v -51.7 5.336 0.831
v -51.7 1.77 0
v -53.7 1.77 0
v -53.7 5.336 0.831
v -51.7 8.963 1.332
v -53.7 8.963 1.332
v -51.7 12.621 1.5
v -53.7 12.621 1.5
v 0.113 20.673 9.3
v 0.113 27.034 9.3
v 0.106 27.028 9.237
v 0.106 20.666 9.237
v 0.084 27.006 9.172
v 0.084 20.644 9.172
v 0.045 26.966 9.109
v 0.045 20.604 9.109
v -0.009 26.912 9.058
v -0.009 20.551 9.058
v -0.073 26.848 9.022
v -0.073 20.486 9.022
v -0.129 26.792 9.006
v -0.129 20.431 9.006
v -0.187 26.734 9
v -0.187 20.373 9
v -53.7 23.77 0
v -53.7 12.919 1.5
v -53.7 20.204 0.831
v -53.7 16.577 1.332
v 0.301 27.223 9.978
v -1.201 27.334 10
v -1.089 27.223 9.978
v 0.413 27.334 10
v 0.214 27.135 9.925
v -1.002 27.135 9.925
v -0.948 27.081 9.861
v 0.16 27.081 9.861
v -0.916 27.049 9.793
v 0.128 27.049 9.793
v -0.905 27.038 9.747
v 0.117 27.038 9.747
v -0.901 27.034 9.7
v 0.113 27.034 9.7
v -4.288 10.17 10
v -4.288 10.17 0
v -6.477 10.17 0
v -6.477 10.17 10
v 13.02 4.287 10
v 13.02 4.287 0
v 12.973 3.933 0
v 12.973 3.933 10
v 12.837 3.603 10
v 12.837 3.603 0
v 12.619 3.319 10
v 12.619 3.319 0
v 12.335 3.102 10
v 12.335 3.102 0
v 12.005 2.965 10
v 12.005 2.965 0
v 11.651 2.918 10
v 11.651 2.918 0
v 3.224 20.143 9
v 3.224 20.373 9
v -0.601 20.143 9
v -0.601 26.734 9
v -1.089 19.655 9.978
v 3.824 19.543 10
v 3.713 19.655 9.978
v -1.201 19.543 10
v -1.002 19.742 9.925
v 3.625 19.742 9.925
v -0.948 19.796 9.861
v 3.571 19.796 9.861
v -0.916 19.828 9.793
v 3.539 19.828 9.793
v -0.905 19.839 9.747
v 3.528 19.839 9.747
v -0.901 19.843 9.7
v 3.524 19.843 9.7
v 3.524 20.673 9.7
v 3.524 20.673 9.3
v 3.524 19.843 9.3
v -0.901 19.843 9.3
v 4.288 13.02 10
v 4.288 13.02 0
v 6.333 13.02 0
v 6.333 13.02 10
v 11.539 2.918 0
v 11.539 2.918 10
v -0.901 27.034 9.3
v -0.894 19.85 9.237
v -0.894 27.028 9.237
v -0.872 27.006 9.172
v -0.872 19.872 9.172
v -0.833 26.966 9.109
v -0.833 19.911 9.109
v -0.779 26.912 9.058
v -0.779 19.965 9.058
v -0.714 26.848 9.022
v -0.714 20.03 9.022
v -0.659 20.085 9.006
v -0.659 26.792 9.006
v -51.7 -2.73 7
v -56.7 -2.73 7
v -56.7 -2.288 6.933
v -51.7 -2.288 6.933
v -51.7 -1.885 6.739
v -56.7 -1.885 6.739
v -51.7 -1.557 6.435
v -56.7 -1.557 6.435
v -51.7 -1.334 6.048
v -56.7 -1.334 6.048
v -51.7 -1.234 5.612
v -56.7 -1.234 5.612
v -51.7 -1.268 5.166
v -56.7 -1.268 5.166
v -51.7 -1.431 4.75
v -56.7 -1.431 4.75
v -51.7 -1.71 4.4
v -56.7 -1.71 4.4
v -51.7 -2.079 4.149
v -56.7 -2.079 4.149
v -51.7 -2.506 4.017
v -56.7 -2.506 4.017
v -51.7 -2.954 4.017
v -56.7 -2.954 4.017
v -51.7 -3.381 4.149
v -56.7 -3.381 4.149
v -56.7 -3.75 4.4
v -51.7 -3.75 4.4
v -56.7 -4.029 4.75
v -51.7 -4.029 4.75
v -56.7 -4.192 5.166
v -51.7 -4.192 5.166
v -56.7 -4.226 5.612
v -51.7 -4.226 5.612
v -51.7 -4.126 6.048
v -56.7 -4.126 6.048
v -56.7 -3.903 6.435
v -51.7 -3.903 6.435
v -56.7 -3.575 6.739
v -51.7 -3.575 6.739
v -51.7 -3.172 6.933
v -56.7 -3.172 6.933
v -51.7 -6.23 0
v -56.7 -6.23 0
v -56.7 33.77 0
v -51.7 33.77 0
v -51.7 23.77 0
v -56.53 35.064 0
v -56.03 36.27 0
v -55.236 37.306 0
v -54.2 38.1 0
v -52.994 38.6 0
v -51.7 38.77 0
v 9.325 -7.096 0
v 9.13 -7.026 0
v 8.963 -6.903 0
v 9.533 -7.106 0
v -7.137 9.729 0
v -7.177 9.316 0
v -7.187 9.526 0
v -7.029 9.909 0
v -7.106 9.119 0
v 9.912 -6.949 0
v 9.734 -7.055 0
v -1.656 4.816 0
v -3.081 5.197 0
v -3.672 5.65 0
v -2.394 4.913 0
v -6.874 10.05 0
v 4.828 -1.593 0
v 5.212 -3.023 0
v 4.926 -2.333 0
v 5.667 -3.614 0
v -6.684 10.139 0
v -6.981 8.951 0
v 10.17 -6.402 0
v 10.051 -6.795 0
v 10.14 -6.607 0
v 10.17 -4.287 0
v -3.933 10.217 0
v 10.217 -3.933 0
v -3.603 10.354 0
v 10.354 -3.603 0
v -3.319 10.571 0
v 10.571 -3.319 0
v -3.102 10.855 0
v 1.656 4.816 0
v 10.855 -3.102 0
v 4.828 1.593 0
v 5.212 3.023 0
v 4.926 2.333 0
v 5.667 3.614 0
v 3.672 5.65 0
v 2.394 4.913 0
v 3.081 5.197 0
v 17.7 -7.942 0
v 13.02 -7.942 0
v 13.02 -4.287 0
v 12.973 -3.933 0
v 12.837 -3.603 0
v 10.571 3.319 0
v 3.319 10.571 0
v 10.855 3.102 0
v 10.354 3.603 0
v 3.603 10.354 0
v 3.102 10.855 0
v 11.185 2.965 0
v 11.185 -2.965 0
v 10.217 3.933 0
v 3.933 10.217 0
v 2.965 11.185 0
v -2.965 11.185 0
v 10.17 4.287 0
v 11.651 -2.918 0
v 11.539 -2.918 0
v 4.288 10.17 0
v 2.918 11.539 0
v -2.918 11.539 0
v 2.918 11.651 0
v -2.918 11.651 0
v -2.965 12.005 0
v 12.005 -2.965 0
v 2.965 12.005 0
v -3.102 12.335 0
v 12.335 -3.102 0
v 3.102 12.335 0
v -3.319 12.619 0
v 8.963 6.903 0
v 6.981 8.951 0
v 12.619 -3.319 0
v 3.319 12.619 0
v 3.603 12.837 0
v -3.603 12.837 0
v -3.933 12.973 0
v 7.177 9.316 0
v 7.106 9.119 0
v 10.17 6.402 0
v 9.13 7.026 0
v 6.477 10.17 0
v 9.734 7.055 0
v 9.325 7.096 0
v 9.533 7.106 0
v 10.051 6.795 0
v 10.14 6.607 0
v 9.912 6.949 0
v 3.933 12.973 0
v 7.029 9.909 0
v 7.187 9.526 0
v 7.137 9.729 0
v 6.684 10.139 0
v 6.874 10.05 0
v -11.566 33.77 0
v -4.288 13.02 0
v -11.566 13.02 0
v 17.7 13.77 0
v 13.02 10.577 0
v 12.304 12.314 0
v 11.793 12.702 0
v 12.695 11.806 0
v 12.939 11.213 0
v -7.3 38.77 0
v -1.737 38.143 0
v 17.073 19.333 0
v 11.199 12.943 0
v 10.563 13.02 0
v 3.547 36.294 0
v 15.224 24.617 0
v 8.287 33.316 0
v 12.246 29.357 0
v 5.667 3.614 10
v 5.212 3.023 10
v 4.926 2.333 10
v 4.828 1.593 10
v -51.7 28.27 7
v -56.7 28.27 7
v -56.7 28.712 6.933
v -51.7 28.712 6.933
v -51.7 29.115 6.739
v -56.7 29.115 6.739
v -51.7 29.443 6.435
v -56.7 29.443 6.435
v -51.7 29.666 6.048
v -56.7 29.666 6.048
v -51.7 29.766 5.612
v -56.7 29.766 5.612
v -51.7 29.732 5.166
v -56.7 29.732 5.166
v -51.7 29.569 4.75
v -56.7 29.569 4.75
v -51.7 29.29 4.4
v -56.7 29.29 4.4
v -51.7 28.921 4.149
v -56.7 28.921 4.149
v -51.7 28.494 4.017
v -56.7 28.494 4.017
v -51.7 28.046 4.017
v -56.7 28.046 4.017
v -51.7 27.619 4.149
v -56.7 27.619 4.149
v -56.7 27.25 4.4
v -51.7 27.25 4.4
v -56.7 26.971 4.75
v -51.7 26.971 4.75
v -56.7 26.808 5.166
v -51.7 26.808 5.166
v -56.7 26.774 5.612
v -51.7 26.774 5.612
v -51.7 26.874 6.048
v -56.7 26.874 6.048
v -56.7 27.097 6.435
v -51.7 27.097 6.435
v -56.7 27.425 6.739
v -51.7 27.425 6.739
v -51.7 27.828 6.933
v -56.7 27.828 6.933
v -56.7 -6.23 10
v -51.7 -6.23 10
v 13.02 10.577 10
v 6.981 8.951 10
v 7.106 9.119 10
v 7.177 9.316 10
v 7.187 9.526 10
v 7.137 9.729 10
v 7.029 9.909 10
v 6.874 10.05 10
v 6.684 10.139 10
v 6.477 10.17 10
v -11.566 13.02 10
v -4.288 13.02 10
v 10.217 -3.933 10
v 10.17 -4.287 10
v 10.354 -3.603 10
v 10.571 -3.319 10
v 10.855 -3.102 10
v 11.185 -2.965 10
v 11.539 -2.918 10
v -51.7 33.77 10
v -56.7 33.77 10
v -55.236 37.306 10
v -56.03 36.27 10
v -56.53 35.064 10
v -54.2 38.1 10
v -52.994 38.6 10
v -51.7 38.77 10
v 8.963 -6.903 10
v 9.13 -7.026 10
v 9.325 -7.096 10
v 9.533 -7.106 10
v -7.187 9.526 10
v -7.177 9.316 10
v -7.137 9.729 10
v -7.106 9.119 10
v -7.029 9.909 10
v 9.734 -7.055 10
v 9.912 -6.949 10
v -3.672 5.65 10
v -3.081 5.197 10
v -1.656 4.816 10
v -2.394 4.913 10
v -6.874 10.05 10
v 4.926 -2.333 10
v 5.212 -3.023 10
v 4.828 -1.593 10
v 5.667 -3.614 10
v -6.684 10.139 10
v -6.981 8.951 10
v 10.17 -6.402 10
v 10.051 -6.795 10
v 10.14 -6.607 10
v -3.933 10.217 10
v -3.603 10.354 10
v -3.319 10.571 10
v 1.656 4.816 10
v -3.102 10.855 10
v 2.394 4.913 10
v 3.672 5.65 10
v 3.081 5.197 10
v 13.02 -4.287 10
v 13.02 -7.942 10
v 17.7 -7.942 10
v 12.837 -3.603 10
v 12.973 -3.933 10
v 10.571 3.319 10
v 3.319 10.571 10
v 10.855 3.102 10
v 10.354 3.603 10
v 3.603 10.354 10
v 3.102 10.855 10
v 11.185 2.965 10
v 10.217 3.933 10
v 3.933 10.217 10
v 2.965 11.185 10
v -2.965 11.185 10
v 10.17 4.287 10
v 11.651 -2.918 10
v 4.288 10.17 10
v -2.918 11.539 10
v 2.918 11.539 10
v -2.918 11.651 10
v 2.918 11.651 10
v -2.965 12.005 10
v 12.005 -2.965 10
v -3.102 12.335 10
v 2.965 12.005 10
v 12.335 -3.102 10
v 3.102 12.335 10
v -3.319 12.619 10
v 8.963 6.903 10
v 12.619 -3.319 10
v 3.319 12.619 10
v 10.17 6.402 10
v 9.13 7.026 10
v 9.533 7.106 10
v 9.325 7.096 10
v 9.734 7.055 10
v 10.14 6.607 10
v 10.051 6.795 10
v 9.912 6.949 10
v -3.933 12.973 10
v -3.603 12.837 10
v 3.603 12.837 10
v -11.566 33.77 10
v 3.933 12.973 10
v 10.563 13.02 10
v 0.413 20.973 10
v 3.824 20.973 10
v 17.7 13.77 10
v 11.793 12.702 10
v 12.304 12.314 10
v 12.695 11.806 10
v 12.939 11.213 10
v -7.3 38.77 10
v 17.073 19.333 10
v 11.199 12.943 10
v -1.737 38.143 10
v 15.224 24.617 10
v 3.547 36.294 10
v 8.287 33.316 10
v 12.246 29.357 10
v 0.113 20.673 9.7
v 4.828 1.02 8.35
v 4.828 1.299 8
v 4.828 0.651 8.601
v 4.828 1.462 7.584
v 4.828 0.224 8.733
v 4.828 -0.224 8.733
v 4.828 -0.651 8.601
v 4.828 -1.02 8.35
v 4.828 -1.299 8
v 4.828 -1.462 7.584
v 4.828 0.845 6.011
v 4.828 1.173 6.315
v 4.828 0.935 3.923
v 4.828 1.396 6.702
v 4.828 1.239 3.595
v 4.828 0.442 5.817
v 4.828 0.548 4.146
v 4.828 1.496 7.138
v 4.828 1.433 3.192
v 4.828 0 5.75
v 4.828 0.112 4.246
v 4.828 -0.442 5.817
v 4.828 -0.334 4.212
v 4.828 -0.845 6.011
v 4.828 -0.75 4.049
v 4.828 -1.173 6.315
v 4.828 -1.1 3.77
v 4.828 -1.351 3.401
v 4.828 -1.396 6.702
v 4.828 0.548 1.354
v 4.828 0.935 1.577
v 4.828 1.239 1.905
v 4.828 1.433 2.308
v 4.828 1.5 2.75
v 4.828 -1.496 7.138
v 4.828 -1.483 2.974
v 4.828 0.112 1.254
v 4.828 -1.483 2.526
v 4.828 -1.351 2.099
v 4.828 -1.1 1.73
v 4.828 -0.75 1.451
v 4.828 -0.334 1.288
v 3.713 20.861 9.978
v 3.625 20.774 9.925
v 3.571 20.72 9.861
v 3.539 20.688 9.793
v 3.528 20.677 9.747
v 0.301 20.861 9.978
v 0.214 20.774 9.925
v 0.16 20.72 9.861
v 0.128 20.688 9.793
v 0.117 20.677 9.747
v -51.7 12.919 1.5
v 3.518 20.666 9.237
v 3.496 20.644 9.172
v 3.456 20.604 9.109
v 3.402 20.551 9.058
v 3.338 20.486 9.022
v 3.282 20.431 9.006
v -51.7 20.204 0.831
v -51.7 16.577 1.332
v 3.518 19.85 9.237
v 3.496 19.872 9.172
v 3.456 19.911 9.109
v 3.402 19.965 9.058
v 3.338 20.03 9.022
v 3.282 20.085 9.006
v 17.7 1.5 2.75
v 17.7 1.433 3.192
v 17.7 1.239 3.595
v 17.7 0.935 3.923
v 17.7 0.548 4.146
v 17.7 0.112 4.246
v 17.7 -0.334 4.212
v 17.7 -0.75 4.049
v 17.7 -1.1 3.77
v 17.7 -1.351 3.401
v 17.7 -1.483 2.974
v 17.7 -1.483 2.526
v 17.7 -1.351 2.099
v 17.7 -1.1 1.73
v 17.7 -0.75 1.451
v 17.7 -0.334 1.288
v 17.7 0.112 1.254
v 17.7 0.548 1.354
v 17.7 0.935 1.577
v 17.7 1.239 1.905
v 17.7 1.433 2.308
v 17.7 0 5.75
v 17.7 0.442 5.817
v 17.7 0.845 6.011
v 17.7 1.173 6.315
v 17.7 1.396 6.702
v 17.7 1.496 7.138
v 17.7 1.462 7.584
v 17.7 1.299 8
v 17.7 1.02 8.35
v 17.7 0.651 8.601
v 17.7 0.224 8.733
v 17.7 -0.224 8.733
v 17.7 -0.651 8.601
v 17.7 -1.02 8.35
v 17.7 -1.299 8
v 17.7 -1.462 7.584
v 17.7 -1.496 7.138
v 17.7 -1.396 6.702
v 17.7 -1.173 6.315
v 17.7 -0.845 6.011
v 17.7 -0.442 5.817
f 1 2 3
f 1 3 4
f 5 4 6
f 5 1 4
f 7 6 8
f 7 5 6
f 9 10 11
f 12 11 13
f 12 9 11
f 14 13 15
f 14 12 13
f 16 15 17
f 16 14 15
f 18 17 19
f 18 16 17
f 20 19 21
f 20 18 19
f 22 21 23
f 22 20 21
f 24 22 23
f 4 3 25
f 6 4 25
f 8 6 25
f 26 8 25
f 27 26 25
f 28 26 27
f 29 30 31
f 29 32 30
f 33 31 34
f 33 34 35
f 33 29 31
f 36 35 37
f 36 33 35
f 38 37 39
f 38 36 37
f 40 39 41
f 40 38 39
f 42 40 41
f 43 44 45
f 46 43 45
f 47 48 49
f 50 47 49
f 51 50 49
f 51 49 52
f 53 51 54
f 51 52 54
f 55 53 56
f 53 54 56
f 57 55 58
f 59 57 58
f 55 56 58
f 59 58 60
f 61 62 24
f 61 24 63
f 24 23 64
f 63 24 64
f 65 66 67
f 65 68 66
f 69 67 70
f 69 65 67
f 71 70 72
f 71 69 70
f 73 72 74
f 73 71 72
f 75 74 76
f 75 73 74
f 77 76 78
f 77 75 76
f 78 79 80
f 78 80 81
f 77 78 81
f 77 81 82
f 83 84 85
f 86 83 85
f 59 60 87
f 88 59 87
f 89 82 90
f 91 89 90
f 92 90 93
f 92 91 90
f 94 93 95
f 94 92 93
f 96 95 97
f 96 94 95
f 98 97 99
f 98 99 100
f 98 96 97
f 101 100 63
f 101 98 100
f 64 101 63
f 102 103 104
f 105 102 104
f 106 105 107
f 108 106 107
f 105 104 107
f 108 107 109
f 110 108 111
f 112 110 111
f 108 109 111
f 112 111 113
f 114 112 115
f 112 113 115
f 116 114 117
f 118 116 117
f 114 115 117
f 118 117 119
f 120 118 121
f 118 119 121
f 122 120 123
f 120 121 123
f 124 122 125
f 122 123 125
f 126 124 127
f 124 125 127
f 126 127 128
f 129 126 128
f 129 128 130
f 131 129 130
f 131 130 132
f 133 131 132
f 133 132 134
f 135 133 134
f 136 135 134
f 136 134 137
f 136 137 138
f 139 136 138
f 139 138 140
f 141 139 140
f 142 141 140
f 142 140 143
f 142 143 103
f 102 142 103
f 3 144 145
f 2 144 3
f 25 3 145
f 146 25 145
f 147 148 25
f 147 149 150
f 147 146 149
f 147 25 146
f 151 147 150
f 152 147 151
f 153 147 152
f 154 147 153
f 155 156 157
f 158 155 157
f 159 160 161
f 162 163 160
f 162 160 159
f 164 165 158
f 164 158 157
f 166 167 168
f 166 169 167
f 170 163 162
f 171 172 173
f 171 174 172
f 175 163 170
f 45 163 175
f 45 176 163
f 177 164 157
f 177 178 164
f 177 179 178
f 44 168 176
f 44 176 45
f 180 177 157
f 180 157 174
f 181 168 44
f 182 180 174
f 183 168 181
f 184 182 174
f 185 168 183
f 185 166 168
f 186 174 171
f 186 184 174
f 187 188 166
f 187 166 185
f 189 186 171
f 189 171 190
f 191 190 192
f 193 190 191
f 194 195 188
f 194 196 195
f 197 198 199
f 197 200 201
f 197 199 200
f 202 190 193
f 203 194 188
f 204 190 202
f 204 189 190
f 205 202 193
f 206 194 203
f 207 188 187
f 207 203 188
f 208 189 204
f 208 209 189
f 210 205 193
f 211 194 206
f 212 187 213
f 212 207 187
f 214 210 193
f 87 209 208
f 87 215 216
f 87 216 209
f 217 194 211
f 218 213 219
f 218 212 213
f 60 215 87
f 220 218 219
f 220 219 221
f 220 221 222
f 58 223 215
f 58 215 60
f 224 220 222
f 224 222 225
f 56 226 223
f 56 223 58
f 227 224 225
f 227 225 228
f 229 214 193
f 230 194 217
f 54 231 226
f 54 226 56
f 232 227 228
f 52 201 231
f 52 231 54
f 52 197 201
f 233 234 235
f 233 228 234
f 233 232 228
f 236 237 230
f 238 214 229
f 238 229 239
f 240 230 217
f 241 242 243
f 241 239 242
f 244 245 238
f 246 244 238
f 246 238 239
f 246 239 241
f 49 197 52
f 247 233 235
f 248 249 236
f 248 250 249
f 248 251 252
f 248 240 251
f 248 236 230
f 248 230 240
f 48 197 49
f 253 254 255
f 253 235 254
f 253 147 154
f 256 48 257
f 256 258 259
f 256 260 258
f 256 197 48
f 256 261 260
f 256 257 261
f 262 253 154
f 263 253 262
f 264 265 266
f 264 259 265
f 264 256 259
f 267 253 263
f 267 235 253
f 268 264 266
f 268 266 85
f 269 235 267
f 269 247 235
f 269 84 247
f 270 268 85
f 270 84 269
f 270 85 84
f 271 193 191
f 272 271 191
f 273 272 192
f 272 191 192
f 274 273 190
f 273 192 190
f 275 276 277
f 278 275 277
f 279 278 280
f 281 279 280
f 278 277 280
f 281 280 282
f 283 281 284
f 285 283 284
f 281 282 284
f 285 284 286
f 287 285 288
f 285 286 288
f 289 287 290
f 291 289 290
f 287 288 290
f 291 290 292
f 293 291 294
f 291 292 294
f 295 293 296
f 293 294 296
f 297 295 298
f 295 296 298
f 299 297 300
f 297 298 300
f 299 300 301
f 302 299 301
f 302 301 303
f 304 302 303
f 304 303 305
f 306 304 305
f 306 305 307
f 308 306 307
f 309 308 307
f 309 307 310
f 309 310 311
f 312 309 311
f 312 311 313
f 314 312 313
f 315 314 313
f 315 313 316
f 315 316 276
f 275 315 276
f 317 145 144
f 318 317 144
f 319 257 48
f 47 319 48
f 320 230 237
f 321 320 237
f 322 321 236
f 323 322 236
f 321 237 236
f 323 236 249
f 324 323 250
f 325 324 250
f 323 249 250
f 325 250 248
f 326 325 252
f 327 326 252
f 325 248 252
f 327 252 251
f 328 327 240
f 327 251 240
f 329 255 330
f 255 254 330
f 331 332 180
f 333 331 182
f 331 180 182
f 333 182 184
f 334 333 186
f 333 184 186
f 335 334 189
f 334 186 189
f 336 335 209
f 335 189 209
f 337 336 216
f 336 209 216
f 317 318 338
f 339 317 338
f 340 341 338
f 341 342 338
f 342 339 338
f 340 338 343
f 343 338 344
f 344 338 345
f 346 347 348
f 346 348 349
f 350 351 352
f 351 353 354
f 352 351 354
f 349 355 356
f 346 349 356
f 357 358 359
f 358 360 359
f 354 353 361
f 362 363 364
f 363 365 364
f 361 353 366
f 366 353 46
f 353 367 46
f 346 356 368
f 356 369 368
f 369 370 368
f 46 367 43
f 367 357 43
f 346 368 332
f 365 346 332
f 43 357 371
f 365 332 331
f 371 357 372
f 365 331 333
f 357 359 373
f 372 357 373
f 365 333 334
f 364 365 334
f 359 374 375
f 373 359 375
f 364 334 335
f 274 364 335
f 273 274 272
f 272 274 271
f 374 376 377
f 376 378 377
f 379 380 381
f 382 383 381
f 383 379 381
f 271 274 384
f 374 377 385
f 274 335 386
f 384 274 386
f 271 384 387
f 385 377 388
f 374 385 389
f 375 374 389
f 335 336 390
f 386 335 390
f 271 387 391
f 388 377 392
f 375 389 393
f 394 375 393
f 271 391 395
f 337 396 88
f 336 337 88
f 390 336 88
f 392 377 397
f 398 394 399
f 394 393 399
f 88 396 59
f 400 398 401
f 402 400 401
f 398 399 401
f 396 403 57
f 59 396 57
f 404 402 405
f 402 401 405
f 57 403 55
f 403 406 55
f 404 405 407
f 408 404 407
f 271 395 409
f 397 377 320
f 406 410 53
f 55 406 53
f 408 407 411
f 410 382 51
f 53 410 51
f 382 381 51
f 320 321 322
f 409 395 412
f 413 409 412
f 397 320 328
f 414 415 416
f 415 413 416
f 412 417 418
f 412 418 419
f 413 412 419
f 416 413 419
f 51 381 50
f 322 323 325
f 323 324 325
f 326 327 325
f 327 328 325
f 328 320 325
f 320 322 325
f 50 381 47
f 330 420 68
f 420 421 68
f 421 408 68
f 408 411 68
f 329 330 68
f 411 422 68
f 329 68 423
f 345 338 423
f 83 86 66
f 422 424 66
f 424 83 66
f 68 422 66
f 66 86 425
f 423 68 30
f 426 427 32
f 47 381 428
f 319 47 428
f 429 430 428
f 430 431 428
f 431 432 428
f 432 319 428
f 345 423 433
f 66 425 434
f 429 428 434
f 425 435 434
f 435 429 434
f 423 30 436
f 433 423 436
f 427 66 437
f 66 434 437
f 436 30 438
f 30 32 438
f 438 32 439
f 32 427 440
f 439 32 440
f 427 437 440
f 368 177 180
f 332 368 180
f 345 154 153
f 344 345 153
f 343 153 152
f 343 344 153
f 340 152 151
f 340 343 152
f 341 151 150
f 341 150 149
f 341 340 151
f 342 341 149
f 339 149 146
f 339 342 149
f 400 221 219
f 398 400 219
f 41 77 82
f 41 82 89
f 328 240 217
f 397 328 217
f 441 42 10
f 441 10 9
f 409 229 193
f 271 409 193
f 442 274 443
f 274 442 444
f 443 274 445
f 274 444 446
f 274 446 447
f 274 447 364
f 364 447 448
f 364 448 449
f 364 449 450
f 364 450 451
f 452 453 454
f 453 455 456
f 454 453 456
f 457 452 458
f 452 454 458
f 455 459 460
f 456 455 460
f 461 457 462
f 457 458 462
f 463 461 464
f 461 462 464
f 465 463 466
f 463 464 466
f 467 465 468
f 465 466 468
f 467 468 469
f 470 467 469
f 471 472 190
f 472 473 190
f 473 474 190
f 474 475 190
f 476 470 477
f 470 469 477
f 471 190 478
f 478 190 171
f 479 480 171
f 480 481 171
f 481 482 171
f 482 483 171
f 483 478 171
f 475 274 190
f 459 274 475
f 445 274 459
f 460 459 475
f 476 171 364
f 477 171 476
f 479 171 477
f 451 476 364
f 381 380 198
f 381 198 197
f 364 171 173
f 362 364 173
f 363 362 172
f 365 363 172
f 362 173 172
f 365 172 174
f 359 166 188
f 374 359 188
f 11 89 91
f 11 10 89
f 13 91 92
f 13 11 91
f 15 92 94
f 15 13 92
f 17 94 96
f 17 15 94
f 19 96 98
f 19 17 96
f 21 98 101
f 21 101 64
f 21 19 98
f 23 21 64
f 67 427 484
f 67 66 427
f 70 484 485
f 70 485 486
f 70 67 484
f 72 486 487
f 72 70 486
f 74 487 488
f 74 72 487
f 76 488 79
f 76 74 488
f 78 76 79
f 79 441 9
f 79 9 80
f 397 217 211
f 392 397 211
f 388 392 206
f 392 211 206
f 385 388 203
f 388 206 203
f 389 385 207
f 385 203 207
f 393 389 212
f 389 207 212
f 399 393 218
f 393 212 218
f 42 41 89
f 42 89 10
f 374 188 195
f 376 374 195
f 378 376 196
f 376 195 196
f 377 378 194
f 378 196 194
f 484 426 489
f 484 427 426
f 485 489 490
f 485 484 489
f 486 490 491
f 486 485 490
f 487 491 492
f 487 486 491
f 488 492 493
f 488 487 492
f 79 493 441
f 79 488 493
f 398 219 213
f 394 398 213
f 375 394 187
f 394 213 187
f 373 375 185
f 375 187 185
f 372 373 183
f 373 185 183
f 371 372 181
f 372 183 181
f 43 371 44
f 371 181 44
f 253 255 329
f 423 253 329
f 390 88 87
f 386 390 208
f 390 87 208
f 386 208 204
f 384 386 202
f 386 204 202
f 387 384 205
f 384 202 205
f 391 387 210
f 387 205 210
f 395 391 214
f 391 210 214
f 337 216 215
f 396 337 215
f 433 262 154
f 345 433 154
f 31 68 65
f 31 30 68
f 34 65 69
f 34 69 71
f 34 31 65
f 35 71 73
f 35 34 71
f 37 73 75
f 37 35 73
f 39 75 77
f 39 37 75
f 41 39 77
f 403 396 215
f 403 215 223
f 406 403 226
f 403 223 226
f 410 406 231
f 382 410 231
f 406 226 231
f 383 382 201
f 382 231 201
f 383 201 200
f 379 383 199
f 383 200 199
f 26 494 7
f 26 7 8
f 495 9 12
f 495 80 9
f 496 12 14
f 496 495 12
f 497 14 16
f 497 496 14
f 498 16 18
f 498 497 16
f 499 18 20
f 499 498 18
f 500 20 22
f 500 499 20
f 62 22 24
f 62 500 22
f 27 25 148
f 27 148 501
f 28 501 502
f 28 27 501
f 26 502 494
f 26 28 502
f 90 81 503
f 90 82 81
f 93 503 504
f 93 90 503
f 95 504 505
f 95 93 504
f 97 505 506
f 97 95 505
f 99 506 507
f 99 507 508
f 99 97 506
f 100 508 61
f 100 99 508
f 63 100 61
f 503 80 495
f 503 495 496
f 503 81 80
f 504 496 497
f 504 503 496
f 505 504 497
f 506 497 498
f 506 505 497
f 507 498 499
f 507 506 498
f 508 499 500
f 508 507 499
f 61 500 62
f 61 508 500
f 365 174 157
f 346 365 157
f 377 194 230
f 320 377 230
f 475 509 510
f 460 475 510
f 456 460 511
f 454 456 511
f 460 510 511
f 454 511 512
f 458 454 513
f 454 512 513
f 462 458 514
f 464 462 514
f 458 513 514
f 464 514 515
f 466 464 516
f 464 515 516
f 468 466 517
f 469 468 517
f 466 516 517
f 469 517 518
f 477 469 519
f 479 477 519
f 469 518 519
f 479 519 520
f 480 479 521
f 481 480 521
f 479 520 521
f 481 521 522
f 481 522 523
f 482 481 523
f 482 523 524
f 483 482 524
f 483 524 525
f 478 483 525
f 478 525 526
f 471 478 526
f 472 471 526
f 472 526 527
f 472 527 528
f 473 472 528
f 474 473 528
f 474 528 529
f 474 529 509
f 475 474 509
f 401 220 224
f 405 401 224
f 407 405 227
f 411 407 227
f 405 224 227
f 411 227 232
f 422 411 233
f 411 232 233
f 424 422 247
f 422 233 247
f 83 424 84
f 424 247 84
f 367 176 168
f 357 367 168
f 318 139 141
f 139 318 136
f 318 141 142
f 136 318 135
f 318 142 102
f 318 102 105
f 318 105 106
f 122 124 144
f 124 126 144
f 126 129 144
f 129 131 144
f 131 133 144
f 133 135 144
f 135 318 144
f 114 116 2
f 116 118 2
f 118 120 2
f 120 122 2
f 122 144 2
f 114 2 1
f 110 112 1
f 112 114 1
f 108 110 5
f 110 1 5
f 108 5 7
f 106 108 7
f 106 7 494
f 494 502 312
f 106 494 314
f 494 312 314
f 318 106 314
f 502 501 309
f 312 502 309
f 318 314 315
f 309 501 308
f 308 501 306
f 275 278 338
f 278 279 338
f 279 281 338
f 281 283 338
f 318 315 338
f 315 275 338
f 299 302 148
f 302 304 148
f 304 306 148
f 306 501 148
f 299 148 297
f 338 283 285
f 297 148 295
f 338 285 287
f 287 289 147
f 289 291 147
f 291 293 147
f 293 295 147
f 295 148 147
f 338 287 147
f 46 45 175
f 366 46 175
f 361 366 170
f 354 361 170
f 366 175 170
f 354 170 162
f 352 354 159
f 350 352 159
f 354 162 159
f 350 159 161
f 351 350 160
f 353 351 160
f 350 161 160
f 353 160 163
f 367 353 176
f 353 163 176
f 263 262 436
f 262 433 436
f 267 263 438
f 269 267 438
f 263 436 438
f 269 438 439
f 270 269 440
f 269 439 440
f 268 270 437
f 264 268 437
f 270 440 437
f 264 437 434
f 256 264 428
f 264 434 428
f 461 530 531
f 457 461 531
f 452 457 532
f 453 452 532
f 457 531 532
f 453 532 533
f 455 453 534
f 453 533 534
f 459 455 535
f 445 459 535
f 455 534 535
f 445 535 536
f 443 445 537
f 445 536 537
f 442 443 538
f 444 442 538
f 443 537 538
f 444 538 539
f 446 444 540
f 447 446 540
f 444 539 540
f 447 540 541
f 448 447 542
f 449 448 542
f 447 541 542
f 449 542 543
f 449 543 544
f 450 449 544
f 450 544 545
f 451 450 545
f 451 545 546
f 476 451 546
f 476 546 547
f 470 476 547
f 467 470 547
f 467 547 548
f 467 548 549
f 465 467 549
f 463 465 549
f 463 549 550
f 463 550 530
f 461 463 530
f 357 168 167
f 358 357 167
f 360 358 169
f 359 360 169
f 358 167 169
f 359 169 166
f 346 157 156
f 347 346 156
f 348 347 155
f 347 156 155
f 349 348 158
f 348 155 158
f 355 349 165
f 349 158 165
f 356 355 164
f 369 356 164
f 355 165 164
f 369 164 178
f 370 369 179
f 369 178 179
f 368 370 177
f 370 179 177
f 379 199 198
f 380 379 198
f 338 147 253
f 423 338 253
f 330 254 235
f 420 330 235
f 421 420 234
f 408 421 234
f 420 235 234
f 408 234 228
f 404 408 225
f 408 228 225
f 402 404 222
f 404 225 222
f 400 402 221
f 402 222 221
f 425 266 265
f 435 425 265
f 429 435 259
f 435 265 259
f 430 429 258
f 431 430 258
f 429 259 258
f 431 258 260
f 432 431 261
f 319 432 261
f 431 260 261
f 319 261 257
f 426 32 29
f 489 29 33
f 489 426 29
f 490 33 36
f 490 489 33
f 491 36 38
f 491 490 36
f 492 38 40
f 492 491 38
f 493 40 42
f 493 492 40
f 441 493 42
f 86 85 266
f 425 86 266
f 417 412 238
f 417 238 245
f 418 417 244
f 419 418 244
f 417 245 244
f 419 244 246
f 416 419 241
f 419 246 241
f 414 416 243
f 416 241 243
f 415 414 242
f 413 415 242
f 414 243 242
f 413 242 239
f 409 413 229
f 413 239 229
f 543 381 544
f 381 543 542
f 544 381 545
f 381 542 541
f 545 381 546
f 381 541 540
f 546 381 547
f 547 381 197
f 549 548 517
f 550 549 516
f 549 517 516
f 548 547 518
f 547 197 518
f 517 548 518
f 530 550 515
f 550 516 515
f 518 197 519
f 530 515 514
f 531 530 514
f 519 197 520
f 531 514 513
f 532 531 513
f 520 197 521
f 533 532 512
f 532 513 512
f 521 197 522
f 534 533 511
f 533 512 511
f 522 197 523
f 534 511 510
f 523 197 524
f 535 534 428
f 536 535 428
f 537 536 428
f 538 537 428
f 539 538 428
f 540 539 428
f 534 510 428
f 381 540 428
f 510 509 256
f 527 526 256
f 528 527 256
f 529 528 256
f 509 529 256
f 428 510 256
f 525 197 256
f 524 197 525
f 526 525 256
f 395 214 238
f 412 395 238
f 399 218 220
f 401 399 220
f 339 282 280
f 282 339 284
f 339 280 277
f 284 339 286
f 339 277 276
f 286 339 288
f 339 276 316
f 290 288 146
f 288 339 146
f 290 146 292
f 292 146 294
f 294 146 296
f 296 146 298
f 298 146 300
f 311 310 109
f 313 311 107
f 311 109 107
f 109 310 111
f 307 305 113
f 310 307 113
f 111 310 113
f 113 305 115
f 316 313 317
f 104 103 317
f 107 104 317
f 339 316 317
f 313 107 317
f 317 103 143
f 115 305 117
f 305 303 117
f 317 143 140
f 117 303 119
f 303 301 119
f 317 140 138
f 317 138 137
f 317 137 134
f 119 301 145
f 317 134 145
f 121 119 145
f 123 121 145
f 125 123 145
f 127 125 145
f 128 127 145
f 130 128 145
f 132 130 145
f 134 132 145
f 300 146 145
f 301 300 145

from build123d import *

# Parameters (mm, degrees)
BOSS_EXTRUDE1_DEPTH = 10
CUT_EXTRUDE1_REACH  = 86.489
SKETCH2_R           = 1.5
FILLET3_R           = 5
CUT_EXTRUDE2_REACH  = 86.489
SKETCH3_R           = 1.5
FILLET4_R           = 25
CUT_EXTRUDE7_DEPTH  = 1
FILLET8_R           = 0.3
SKETCH8_W           = 10
SKETCH8_H           = 20.75
BOSS_EXTRUDE2_DEPTH = 1
SKETCH10_W          = 4
SKETCH10_H          = 22
CUT_EXTRUDE9_DEPTH  = 1.5
FILLET10_R          = 40


with BuildPart() as part:
    # Sketch1 → Boss-Extrude1 (new body)
    with BuildSketch(Plane.XY):
        with BuildLine():
            Line((13.02, -7.9417418), (17.7, -7.9417418))
            Line((17.7, -7.9417418), (17.7, 38.77))
            Line((17.7, 38.77), (-56.7, 38.77))
            Line((-56.7, 38.77), (-56.7, -6.23))
            Line((-56.7, -6.23), (-51.7, -6.23))
            Line((-51.7, -6.23), (-51.7, 33.77))
            Line((-51.7, 33.77), (-10.566443095, 33.77))
            Line((-10.566443095, 33.77), (-10.566443095, 13.02))
            Line((-10.566443095, 13.02), (-5.317126718, 13.02))
            Line((-5.317126718, 13.02), (-4.287512407, 13.02))
            ThreePointArc((-4.287512407, 13.02), (-3.319474451, 12.619025549), (-2.9185, 11.650987593))
            Line((-2.9185, 11.650987593), (-2.9185, 11.539212407))
            ThreePointArc((-2.9185, 11.539212407), (-3.319474451, 10.571174451), (-4.287512407, 10.1702))
            Line((-4.287512407, 10.1702), (-6.476788598, 10.1702))
            ThreePointArc((-6.476788598, 10.1702), (-7.136510935, 9.729114651), (-6.981020848, 8.950903446))
            Line((-6.981020848, 8.950903446), (-3.672257405, 5.649701928))
            ThreePointArc((-3.672257405, 5.649701928), (-2.746830644, 5.032499411), (-1.655778399, 4.8158))
            Line((-1.655778399, 4.8158), (1.655778399, 4.8158))
            ThreePointArc((1.655778399, 4.8158), (2.746830644, 5.032499411), (3.672257405, 5.649701928))
            Line((3.672257405, 5.649701928), (6.981020848, 8.950903446))
            ThreePointArc((6.981020848, 8.950903446), (7.136510935, 9.729114651), (6.476788598, 10.1702))
            Line((6.476788598, 10.1702), (4.287512407, 10.1702))
            ThreePointArc((4.287512407, 10.1702), (3.319474451, 10.571174451), (2.9185, 11.539212407))
            Line((2.9185, 11.539212407), (2.9185, 11.650987593))
            ThreePointArc((2.9185, 11.650987593), (3.319474451, 12.619025549), (4.287512407, 13.02))
            Line((4.287512407, 13.02), (6.332886163, 13.02))
            Line((6.332886163, 13.02), (10.562594215, 13.019824354))
            ThreePointArc((10.562594215, 13.019824354), (12.303594776, 12.313982883), (13.019956614, 10.577284622))
            Line((13.019956614, 10.577284622), (13.02, 4.287469289))
            ThreePointArc((13.02, 4.287469289), (12.619025549, 3.319431332), (11.650987593, 2.918456882))
            Line((11.650987593, 2.918456882), (11.539212407, 2.918456882))
            ThreePointArc((11.539212407, 2.918456882), (10.571174451, 3.319431332), (10.1702, 4.287469289))
            Line((10.1702, 4.287469289), (10.1702, 6.402089023))
            ThreePointArc((10.1702, 6.402089023), (9.733877283, 7.055496588), (8.963146507, 6.90287605))
            Line((8.963146507, 6.90287605), (5.667020993, 3.614283579))
            ThreePointArc((5.667020993, 3.614283579), (5.046449321, 2.687255303), (4.8285, 1.593185507))
            Line((4.8285, 1.593185507), (4.8285, -1.593185507))
            ThreePointArc((4.8285, -1.593185507), (5.046449321, -2.687255303), (5.667020993, -3.614283579))
            Line((5.667020993, -3.614283579), (8.963146507, -6.90287605))
            ThreePointArc((8.963146507, -6.90287605), (9.733877283, -7.055496588), (10.1702, -6.402089023))
            Line((10.1702, -6.402089023), (10.1702, -4.287469289))
            ThreePointArc((10.1702, -4.287469289), (10.571174451, -3.319431332), (11.539212407, -2.918456882))
            Line((11.539212407, -2.918456882), (11.650987593, -2.918456882))
            ThreePointArc((11.650987593, -2.918456882), (12.619025549, -3.319431332), (13.02, -4.287469289))
            Line((13.02, -4.287469289), (13.02, -5.3170836))
            Line((13.02, -5.3170836), (13.02, -7.9417418))
        make_face()
    extrude(amount=BOSS_EXTRUDE1_DEPTH)

    # Sketch2 → Cut-Extrude1 (cut, up to next)
    with BuildSketch(Plane.ZY.offset(56.7), mode=Mode.PRIVATE) as cut_extrude1_sk1:
        with Locations((5.5, -2.73)):
            Circle(SKETCH2_R)
    cut_extrude1_tool1 = extrude(cut_extrude1_sk1.sketch, amount=-CUT_EXTRUDE1_REACH, mode=Mode.PRIVATE) & part.part
    # Sketch2 → Cut-Extrude1 (cut, up to next)
    with BuildSketch(Plane.ZY.offset(56.7), mode=Mode.PRIVATE) as cut_extrude1_sk2:
        with Locations((5.5, 28.27)):
            Circle(SKETCH2_R)
    cut_extrude1_tool2 = extrude(cut_extrude1_sk2.sketch, amount=-CUT_EXTRUDE1_REACH, mode=Mode.PRIVATE) & part.part
    add(cut_extrude1_tool1.solids().sort_by_distance((-56.7, -2.73, 5.5))[0], mode=Mode.SUBTRACT)
    add(cut_extrude1_tool2.solids().sort_by_distance((-56.7, 28.27, 5.5))[0], mode=Mode.SUBTRACT)

    # Fillet3
    fillet3_edges = [part.edges().sort_by_distance(p)[0] for p in [
        (-56.7, 38.77, 5),
    ]]
    fillet(fillet3_edges, radius=FILLET3_R)

    # Sketch3 → Cut-Extrude2 (cut, up to next)
    with BuildSketch(Plane(origin=(17.7, 0, 0), x_dir=(0, 0, -1), z_dir=(1, 0, 0)), mode=Mode.PRIVATE) as cut_extrude2_sk1:
        with Locations((-7.25, 0)):
            Circle(SKETCH3_R)
    cut_extrude2_tool1 = extrude(cut_extrude2_sk1.sketch, amount=-CUT_EXTRUDE2_REACH, mode=Mode.PRIVATE) & part.part
    # Sketch3 → Cut-Extrude2 (cut, up to next)
    with BuildSketch(Plane(origin=(17.7, 0, 0), x_dir=(0, 0, -1), z_dir=(1, 0, 0)), mode=Mode.PRIVATE) as cut_extrude2_sk2:
        with Locations(Location((-2.75, 0, 0), (0, 0, 90))):
            Circle(SKETCH3_R)
    cut_extrude2_tool2 = extrude(cut_extrude2_sk2.sketch, amount=-CUT_EXTRUDE2_REACH, mode=Mode.PRIVATE) & part.part
    add(cut_extrude2_tool1.solids().sort_by_distance((17.7, 0, 7.25))[0], mode=Mode.SUBTRACT)
    add(cut_extrude2_tool2.solids().sort_by_distance((17.7, 0, 2.75))[0], mode=Mode.SUBTRACT)

    # Fillet4
    fillet4_edges = [part.edges().sort_by_distance(p)[0] for p in [
        (17.7, 38.77, 5),
    ]]
    fillet(fillet4_edges, radius=FILLET4_R)

    # Sketch7 → Cut-Extrude7 (cut)
    with BuildSketch(Plane.XY.offset(10)):
        Polygon((-0.90100078, 19.84300121), (-0.90100078, 27.034293528), (0.113155829, 27.034293528), (0.113155829, 20.672765708), (3.524409877, 20.672765708), (3.524409877, 19.84300121), align=None)
    extrude(amount=-CUT_EXTRUDE7_DEPTH, mode=Mode.SUBTRACT)

    # Fillet8
    fillet8_edges = [part.edges().sort_by_distance(p)[0] for p in [
        (1.311704549, 19.84300121, 10),
        (-0.90100078, 23.438647369, 10),
        (-0.393922475, 27.034293528, 10),
        (0.113155829, 23.853529618, 10),
        (1.818782853, 20.672765708, 10),
        (3.524409877, 20.257883459, 10),
        (1.311704549, 19.84300121, 9),
        (-0.90100078, 23.438647369, 9),
        (-0.393922475, 27.034293528, 9),
        (0.113155829, 23.853529618, 9),
        (1.818782853, 20.672765708, 9),
        (3.524409877, 20.257883459, 9),
    ]]
    fillet(fillet8_edges, radius=FILLET8_R)

    # Sketch8 → Boss-Extrude2 (add)
    with BuildSketch(Plane.ZY.offset(10.566443095)):
        with Locations((5, 23.395)):
            Rectangle(SKETCH8_W, SKETCH8_H)
    extrude(amount=BOSS_EXTRUDE2_DEPTH)

    # Sketch10 → Cut-Extrude9 (cut)
    with BuildSketch(Plane(origin=(0, 0, 0), x_dir=(-1, 0, 0), z_dir=(0, 0, -1))):
        with Locations((51.7, 12.77)):
            Rectangle(SKETCH10_W, SKETCH10_H)
    extrude(amount=-CUT_EXTRUDE9_DEPTH, mode=Mode.SUBTRACT)

    # Fillet10
    # the kernel refuses this fillet: 40 mm, written as the material it adds along each edge
    with BuildSketch(Plane(origin=(-51.7, 1.77, 1.5), x_dir=(0, 0, -1), z_dir=(-1, 0, 0))) as fillet10_piece_1:
        with BuildLine():
            CenterArc((40, -10.851267207), FILLET10_R, 164.259451475, 15.740548525)
            Line((0, -10.851267207), (0, 0))
            Line((0, 0), (1.5, 0))
        make_face()
    extrude(amount=2)
    with BuildSketch(Plane(origin=(-53.7, 23.77, 1.5), x_dir=(0, -1, 0), z_dir=(1, 0, 0))) as fillet10_piece_2:
        with BuildLine():
            CenterArc((10.851267207, 40), FILLET10_R, 254.259451475, 15.740548525)
            Line((0, 1.5), (0, 0))
            Line((0, 0), (10.851267207, 0))
        make_face()
    extrude(amount=2)


solid = part.part
